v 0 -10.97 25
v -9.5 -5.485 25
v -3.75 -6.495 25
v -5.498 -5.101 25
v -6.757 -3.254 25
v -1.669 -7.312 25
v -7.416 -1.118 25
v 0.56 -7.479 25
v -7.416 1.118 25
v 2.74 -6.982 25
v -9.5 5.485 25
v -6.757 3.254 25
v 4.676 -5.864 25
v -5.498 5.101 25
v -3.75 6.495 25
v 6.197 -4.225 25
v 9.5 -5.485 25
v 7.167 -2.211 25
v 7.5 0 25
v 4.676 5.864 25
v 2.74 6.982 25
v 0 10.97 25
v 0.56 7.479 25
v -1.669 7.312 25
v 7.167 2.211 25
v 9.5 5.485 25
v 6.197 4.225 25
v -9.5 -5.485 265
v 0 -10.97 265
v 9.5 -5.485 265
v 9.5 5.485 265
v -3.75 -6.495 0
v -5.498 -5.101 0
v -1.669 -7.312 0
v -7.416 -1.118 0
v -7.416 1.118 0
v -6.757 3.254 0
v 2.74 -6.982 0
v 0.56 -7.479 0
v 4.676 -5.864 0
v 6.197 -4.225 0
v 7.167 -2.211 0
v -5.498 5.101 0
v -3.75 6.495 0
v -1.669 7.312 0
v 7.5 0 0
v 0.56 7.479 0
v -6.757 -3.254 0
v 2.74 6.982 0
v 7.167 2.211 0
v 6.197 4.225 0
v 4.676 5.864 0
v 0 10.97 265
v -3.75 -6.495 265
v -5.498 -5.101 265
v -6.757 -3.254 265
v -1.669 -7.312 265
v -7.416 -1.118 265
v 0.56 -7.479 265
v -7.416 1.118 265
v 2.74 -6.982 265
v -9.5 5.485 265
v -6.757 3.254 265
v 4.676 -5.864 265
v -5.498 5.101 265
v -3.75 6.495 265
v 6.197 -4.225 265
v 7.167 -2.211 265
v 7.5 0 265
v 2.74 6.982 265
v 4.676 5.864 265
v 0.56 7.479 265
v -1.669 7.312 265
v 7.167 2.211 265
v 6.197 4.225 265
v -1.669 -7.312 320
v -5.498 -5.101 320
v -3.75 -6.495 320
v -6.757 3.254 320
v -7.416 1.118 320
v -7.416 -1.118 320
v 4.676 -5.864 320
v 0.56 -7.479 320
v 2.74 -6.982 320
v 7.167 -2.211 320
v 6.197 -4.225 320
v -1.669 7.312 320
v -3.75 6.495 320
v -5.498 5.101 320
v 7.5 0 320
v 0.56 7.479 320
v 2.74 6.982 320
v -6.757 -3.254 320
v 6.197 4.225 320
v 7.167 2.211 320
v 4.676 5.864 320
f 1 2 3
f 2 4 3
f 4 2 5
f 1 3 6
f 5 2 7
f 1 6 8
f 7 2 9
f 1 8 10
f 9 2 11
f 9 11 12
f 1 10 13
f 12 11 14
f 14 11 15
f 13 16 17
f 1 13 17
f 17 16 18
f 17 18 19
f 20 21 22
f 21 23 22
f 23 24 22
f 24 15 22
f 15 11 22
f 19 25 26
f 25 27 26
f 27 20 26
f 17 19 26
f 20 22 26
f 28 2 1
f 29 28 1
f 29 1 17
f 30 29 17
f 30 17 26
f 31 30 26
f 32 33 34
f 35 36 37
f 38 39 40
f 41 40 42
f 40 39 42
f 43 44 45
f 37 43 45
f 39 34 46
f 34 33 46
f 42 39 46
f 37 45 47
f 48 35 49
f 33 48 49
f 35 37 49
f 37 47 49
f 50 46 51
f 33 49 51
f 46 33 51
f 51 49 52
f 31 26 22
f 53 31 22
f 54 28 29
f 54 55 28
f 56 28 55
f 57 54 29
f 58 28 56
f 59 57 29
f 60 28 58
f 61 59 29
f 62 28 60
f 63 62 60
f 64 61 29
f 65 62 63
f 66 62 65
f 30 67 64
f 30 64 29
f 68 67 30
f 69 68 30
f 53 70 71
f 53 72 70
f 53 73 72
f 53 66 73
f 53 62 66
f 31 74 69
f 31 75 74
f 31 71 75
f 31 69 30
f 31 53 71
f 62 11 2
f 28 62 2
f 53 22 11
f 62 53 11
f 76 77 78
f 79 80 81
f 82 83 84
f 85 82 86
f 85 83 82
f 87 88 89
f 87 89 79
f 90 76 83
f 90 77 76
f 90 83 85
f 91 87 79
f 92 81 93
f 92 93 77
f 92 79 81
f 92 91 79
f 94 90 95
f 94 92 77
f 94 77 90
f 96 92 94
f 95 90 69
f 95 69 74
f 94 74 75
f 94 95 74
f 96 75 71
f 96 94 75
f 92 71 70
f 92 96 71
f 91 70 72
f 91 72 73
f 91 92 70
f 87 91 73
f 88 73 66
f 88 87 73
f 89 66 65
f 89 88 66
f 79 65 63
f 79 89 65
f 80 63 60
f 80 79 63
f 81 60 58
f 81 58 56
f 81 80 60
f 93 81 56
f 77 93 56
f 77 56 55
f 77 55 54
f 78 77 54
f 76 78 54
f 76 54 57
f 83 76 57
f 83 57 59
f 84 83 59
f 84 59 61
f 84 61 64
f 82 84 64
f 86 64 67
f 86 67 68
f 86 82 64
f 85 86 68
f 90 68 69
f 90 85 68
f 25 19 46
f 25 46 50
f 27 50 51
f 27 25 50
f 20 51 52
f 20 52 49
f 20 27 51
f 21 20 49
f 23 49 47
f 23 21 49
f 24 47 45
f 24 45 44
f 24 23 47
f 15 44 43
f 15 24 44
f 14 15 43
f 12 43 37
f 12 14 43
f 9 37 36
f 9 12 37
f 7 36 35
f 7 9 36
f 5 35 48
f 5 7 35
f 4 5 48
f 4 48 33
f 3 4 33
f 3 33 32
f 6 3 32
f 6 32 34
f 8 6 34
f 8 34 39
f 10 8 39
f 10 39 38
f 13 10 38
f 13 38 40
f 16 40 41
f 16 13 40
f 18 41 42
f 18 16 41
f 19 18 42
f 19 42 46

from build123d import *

# Parameters (mm, degrees)
BOSS_EXTRU_1_DEPTH      = 320
ESQUISSE2_R             = 10.969655115
ESQUISSE2_R_2           = 7.5
ENL_V_MAT_EXTRU_1_DEPTH = 55
ENL_V_START             = -295
ESQUISSE2_2_R           = 10.969655115
ESQUISSE2_2_R_2         = 7.5
ENL_V_MAT_EXTRU_2_DEPTH = 25


with BuildPart() as part:
    # Esquisse1 → Boss.-Extru.1 (new body)
    with BuildSketch(Plane.XY):
        Polygon((9.5, -5.484827557), (9.5, 5.484827557), (0, 10.969655115), (-9.5, 5.484827557), (-9.5, -5.484827557), (0, -10.969655115), align=None)
    extrude(amount=BOSS_EXTRU_1_DEPTH)

    # Esquisse2 → Enlèv. mat.-Extru.1 (cut)
    with BuildSketch(Plane.XY.offset(320)):
        Circle(ESQUISSE2_R)
        Circle(ESQUISSE2_R_2, mode=Mode.SUBTRACT)
    extrude(amount=-ENL_V_MAT_EXTRU_1_DEPTH, mode=Mode.SUBTRACT)

    # Esquisse2<2> → Enlèv. mat.-Extru.2 (cut)
    with BuildSketch(Plane.XY.offset(320).offset(ENL_V_START)):
        Circle(ESQUISSE2_2_R)
        Circle(ESQUISSE2_2_R_2, mode=Mode.SUBTRACT)
    extrude(amount=-ENL_V_MAT_EXTRU_2_DEPTH, mode=Mode.SUBTRACT)


solid = part.part
